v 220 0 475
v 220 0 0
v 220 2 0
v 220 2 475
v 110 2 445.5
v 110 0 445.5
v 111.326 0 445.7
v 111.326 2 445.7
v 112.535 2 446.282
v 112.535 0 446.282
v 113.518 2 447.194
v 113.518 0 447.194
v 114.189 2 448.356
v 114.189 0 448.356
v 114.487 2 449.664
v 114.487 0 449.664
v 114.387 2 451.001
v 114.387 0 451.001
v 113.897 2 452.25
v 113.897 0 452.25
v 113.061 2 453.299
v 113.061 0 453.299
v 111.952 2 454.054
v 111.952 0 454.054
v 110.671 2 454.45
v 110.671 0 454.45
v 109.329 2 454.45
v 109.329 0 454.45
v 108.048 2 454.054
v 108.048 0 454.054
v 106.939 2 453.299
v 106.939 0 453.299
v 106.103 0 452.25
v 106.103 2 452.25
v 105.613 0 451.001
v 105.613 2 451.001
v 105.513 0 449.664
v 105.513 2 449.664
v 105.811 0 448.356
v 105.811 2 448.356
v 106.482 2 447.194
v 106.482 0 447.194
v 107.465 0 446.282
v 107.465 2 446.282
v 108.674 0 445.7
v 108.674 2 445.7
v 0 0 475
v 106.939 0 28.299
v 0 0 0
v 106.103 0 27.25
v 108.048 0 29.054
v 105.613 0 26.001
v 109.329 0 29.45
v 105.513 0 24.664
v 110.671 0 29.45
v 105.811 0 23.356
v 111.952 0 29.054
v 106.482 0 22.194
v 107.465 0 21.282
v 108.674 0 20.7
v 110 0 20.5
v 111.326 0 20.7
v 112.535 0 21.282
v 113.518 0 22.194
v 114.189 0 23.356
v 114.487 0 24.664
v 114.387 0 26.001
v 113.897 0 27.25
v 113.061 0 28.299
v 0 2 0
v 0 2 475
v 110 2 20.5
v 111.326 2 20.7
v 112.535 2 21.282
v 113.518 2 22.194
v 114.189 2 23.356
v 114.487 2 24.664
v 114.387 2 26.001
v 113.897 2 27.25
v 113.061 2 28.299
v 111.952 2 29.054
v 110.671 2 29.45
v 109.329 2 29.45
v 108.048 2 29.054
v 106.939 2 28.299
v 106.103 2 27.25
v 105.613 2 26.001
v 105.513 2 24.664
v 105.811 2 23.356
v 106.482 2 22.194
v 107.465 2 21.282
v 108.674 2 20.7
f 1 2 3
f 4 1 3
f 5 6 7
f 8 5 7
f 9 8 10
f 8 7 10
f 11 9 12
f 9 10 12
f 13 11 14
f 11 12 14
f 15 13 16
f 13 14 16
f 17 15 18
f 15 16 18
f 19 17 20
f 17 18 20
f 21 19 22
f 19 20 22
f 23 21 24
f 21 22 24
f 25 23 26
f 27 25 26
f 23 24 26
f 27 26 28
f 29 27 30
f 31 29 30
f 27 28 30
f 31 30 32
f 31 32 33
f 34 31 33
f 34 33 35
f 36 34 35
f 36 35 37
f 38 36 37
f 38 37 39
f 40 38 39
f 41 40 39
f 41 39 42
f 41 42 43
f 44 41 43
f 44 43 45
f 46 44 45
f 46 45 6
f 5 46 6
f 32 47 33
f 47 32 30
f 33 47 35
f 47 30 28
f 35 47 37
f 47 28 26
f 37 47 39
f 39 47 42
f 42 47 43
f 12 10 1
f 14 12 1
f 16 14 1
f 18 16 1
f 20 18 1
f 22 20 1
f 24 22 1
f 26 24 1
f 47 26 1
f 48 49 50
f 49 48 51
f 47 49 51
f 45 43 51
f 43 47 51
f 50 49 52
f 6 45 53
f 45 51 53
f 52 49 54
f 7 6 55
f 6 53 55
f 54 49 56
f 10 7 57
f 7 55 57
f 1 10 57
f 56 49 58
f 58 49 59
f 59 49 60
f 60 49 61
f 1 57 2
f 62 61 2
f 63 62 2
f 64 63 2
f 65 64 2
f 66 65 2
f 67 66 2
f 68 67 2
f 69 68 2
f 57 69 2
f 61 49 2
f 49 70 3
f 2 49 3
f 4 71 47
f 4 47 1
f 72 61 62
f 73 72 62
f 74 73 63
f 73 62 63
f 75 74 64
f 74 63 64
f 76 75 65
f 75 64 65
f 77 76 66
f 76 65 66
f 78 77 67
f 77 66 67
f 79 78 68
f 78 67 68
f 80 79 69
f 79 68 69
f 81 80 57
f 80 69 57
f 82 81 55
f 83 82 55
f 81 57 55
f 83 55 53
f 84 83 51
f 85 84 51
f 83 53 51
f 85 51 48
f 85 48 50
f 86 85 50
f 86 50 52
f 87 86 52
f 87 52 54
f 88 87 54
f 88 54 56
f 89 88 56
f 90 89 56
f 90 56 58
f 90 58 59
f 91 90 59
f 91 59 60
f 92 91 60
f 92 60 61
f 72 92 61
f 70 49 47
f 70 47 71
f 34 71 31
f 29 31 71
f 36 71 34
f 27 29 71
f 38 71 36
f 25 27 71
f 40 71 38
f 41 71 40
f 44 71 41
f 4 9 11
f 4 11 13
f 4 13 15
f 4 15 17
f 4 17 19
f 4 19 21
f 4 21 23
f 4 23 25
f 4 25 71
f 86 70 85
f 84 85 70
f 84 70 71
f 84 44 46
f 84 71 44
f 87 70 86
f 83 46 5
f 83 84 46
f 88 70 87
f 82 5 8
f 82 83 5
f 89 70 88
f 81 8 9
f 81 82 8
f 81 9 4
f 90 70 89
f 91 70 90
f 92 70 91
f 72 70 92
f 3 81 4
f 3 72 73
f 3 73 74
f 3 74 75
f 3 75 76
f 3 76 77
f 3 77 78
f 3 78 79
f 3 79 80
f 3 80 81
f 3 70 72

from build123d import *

# Parameters (mm, degrees)
ESBO_O1_W                   = 220
ESBO_O1_H                   = 2
RESSALTO_EXTRUS_O1_DEPTH    = 475
FURO_COM_FOLGA_DE_M81_D     = 9
FURO_COM_FOLGA_DE_M81_DEPTH = 10
FURO_COM_FOLGA_DE_M81_TIP   = 2.703872786


with BuildPart() as part:
    # Esboço1 → Ressalto-extrusão1 (new body)
    with BuildSketch(Plane.XY):
        with Locations((110, 1)):
            Rectangle(ESBO_O1_W, ESBO_O1_H)
    extrude(amount=RESSALTO_EXTRUS_O1_DEPTH)

    # Furo com folga de M81
    with Locations(Plane(origin=(110, 2, 25), x_dir=(0, 0, 1), z_dir=(0, 1, 0))):
        with Locations((0, 0), (425, 0)):
            Hole(FURO_COM_FOLGA_DE_M81_D / 2, depth=FURO_COM_FOLGA_DE_M81_DEPTH)
            with Locations((0, 0, -(FURO_COM_FOLGA_DE_M81_DEPTH + FURO_COM_FOLGA_DE_M81_TIP / 2))):  # 118° drill point
                Cone(0, FURO_COM_FOLGA_DE_M81_D / 2, FURO_COM_FOLGA_DE_M81_TIP, mode=Mode.SUBTRACT)


solid = part.part
